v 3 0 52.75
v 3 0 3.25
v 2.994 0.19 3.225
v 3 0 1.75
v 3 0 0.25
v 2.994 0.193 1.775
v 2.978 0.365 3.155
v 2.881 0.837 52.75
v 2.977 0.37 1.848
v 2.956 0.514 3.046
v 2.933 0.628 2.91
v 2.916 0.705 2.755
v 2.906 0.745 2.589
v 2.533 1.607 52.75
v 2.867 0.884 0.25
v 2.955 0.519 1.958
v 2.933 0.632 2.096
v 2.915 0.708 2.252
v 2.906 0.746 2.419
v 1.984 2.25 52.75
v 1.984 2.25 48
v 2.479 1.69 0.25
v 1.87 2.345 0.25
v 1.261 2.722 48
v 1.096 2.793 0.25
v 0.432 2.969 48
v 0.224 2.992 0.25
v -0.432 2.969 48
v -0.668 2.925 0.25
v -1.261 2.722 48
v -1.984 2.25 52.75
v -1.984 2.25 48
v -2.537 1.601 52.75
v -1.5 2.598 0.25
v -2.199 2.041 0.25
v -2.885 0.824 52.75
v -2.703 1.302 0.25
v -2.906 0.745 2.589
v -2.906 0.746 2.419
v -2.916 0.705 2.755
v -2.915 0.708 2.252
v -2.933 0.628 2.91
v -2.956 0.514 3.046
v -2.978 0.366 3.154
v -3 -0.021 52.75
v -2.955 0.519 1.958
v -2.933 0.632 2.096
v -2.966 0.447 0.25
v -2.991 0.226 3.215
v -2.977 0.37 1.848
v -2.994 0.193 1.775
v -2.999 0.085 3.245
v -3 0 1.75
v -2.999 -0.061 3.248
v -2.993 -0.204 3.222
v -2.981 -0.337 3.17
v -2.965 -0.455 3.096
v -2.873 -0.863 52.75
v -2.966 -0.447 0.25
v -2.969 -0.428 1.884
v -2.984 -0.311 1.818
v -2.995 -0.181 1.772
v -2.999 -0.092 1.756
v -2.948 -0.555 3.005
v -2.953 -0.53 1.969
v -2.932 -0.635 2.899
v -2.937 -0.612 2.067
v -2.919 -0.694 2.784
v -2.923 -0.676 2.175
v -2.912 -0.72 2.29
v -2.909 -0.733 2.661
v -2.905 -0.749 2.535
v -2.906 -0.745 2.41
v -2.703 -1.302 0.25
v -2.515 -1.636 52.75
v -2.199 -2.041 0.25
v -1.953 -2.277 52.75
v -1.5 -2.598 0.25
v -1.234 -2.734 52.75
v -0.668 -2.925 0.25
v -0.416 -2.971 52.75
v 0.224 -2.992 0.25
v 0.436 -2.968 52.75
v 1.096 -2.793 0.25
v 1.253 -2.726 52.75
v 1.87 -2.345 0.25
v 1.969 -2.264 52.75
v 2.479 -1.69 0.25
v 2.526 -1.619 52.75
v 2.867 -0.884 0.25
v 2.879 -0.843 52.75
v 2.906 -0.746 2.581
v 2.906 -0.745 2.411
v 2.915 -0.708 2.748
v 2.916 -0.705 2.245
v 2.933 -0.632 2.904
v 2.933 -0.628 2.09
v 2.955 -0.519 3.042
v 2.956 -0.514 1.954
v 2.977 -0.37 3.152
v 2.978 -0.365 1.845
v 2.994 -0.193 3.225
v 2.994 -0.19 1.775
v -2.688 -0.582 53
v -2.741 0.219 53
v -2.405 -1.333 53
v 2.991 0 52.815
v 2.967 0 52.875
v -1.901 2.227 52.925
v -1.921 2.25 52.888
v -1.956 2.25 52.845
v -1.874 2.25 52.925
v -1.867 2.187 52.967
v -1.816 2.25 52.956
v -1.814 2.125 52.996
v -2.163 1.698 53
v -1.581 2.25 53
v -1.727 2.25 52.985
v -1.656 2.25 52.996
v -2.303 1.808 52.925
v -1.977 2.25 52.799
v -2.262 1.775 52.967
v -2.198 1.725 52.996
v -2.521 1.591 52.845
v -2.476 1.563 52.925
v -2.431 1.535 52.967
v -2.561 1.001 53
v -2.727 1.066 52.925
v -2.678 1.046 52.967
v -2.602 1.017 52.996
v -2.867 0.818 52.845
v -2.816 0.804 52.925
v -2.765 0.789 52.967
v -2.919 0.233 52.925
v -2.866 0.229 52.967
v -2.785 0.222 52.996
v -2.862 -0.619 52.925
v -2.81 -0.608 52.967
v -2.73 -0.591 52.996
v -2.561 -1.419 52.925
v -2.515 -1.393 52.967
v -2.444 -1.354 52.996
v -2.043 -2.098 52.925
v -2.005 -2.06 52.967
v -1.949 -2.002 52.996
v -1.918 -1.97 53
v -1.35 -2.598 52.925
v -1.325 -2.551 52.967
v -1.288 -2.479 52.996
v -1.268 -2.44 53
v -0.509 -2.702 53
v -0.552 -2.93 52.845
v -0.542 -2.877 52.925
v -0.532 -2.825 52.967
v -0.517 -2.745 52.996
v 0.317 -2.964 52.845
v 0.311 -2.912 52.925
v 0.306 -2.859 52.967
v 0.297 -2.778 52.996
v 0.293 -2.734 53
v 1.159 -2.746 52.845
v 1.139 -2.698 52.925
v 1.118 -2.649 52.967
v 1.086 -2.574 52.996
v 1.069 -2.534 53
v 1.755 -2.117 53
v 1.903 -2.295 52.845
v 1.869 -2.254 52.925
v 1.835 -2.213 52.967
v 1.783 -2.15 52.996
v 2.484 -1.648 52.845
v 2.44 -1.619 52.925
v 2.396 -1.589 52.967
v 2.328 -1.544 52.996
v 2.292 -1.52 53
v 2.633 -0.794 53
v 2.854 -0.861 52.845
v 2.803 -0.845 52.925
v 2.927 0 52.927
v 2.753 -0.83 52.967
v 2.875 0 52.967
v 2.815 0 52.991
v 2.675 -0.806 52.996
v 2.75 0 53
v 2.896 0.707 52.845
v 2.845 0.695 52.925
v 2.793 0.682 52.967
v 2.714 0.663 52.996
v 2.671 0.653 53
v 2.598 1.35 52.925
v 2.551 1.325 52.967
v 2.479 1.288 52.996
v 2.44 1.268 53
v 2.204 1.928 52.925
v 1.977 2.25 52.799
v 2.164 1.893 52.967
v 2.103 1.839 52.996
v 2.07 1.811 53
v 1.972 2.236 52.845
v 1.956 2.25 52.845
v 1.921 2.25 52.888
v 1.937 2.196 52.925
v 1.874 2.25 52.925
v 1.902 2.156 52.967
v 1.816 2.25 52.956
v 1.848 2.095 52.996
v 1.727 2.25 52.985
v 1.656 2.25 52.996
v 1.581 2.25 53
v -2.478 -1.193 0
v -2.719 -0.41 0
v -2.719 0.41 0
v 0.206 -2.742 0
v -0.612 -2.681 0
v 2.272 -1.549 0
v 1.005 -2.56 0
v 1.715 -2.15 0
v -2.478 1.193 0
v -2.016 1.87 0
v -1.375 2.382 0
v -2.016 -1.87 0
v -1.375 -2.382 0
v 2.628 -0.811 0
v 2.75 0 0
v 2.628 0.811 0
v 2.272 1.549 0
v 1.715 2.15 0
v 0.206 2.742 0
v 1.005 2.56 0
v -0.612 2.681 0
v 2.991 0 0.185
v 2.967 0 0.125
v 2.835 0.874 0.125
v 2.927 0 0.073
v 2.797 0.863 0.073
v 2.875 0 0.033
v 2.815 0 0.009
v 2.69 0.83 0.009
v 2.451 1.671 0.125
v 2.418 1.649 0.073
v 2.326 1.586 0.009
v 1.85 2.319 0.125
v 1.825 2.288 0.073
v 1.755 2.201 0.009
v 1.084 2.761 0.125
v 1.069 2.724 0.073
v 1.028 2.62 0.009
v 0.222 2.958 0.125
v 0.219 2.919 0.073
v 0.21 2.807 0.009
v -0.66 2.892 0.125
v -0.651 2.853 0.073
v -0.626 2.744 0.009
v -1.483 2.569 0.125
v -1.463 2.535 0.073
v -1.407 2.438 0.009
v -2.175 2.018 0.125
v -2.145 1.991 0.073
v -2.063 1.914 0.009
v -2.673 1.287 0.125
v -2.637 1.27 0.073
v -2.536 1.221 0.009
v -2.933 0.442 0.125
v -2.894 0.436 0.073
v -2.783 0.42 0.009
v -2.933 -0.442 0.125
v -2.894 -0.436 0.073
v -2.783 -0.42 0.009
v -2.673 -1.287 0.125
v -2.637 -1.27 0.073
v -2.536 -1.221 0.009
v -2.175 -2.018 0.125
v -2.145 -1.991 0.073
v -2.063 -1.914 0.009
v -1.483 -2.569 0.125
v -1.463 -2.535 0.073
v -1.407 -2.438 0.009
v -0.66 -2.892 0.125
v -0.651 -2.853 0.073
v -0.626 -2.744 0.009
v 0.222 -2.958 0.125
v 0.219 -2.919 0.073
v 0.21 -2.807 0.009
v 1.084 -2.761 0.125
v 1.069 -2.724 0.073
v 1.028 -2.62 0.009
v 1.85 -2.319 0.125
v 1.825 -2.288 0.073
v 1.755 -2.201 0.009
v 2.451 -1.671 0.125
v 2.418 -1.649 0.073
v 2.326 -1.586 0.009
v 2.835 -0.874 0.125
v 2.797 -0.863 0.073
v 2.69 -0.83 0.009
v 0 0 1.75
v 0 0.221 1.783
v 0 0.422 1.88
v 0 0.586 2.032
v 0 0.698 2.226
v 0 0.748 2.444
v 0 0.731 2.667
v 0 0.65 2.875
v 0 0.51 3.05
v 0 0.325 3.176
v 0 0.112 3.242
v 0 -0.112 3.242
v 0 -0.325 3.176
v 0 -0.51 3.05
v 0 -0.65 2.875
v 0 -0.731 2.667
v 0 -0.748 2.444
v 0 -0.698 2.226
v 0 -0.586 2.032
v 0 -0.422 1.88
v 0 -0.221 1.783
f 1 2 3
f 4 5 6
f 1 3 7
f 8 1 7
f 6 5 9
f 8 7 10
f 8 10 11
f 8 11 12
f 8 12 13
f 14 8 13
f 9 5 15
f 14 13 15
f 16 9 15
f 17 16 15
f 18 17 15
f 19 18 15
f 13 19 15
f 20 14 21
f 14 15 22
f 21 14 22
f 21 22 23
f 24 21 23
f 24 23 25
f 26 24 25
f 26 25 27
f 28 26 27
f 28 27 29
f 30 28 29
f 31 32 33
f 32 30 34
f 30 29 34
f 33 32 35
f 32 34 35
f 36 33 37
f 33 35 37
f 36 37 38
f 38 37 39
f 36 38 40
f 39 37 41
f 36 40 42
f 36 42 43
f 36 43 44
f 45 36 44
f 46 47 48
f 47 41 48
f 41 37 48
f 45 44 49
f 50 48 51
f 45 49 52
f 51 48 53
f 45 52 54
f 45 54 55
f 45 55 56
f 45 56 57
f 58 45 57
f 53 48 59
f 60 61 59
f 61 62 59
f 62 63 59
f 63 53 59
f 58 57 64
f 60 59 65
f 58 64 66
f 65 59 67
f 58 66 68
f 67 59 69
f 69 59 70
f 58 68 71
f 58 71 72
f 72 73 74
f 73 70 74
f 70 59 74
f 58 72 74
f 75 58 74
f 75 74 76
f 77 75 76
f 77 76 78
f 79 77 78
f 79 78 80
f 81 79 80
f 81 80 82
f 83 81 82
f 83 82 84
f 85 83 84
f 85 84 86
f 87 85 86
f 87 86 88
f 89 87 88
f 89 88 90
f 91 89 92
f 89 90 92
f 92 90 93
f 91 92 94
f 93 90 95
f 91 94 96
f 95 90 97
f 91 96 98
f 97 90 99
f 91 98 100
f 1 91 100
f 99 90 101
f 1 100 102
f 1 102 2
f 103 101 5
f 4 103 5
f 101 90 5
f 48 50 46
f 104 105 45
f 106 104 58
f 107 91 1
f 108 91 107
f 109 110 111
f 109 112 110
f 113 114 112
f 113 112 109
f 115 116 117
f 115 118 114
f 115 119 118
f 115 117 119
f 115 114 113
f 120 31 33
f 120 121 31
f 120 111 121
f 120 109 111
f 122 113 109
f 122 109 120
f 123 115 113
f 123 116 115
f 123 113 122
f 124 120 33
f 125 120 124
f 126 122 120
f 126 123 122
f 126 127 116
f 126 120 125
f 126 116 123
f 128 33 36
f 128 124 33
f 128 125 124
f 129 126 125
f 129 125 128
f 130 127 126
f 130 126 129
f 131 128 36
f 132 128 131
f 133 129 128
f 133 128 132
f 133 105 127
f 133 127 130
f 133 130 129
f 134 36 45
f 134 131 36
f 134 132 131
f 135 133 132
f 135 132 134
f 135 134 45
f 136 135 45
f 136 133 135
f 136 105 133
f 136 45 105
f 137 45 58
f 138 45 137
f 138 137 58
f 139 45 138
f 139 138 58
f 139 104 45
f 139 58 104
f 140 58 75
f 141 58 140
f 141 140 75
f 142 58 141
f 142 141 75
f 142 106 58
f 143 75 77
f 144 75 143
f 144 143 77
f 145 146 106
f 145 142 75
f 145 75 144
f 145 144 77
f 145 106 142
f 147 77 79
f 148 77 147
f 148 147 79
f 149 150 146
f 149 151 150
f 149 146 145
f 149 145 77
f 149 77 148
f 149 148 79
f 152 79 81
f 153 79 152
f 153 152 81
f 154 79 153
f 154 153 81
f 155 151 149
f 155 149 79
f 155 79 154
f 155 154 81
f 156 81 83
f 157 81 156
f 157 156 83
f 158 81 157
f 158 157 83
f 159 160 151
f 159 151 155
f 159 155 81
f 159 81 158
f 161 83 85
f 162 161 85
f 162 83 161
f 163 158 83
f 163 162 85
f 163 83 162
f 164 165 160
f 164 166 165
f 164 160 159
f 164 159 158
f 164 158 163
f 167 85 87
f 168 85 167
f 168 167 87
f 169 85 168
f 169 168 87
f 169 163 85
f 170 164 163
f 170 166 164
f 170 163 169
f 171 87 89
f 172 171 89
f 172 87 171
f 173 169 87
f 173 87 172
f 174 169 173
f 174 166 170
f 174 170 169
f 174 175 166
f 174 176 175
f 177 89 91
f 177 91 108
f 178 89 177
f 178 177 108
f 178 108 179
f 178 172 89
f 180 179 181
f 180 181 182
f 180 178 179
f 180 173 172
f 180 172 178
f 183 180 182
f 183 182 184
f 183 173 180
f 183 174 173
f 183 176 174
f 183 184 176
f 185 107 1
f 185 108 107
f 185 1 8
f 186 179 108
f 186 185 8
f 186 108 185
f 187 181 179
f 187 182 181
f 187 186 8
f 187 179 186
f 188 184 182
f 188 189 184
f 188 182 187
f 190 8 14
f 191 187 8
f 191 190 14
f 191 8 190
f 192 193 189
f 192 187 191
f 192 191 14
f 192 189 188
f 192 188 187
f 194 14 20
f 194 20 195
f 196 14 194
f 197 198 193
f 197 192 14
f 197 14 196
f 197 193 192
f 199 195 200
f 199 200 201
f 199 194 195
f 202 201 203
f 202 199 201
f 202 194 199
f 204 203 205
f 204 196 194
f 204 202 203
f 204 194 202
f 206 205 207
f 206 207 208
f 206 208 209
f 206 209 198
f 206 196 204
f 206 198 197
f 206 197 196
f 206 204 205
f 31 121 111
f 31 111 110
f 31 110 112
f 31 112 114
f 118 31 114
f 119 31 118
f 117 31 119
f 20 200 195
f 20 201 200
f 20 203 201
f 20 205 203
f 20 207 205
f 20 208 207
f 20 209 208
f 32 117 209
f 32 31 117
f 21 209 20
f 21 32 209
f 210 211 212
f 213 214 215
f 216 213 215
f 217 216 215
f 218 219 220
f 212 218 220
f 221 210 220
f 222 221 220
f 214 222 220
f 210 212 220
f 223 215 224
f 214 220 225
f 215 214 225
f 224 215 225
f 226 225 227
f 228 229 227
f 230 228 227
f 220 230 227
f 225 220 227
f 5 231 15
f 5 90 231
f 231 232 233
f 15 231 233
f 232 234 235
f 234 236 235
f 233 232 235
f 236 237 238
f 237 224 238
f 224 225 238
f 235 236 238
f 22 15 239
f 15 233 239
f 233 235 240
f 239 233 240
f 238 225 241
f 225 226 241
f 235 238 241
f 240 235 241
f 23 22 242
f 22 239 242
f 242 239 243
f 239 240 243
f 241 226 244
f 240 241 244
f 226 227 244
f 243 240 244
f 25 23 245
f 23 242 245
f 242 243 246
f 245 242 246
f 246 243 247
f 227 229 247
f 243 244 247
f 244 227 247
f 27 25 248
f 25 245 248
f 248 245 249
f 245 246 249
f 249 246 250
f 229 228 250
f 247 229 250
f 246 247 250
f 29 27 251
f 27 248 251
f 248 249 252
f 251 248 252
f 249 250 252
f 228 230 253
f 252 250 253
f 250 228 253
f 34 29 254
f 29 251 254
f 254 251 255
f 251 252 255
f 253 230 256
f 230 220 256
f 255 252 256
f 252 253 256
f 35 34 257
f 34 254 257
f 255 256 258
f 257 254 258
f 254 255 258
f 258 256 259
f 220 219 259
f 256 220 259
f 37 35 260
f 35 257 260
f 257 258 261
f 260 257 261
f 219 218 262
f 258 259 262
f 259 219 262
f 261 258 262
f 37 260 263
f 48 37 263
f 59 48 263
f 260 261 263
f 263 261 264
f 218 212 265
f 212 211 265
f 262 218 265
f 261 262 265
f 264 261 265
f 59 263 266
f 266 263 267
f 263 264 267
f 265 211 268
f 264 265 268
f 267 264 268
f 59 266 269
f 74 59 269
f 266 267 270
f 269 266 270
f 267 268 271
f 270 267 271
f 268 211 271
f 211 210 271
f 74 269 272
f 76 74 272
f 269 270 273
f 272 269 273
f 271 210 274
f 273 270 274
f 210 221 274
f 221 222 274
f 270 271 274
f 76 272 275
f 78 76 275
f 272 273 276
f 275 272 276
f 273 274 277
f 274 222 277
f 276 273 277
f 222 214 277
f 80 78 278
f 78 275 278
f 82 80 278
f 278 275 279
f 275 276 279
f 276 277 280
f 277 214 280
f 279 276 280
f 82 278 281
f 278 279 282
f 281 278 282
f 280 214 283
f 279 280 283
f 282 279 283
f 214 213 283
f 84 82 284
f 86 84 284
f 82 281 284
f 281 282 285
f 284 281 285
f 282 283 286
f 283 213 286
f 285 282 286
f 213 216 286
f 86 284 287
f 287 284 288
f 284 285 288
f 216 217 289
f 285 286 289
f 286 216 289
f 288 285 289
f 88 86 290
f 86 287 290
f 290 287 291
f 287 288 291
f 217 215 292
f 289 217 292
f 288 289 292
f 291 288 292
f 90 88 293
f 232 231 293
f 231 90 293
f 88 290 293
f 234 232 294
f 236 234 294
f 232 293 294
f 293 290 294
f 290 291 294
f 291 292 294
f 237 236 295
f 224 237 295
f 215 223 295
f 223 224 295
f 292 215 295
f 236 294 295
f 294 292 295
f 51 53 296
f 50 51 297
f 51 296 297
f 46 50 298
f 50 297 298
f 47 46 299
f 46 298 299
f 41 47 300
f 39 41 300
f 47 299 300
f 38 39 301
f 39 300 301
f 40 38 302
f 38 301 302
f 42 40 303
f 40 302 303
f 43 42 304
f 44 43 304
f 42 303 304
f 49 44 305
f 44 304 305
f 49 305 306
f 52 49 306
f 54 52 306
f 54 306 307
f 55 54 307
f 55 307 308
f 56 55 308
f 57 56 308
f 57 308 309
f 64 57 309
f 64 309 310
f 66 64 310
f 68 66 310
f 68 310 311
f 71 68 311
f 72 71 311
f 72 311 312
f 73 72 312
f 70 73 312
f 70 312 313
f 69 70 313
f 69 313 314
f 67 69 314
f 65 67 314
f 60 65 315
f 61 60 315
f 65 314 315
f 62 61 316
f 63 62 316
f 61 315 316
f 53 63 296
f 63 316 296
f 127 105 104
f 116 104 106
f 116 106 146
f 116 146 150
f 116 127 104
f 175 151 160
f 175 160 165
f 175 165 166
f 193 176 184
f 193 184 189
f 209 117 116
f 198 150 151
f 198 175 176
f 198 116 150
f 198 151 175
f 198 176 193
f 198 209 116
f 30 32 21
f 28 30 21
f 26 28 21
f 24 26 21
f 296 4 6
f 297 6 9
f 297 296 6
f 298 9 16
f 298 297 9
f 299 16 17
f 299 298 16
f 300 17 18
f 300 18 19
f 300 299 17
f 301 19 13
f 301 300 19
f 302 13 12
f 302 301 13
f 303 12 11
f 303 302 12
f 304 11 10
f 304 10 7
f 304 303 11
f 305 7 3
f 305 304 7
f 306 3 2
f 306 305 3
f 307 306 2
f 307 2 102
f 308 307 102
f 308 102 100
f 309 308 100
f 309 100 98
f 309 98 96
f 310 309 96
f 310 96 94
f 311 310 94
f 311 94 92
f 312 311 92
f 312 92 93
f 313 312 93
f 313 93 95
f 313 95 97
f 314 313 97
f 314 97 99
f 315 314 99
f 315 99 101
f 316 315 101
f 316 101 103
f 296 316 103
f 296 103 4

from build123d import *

# Parameters (mm, degrees)
SKETCH1_R               = 3
BOSS_EXTRUDE1_DEPTH     = 53
FILLET1_R               = 0.25
SKETCH2_R               = 0.75
CUT_EXTRUDE1_DEPTH      = 4.0000001
CUT_EXTRUDE1_DEPTH_BACK = 4.0000001
SKETCH4_W               = 15
SKETCH4_H               = 5
CUT_EXTRUDE2_DEPTH      = 53


with BuildPart() as part:
    # Sketch1 → Boss-Extrude1 (new body)
    with BuildSketch(Plane.XY):
        Circle(SKETCH1_R)
    extrude(amount=BOSS_EXTRUDE1_DEPTH)

    # Fillet1
    fillet1_edges = [part.edges().sort_by_distance(p)[0] for p in [
        (-3, 0, 0),
        (-3, 0, 53),
    ]]
    fillet(fillet1_edges, radius=FILLET1_R)

    # Sketch2 → Cut-Extrude1 (cut, two sides)
    with BuildSketch(Plane(origin=(0, 0, 0), x_dir=(0, 0, -1), z_dir=(1, 0, 0))) as cut_extrude1_sk:
        with Locations((-2.5, 0)):
            Circle(SKETCH2_R)
    extrude(amount=CUT_EXTRUDE1_DEPTH, mode=Mode.SUBTRACT)
    extrude(cut_extrude1_sk.sketch, amount=-CUT_EXTRUDE1_DEPTH_BACK, mode=Mode.SUBTRACT)

    # Sketch4 → Cut-Extrude2 (cut)
    with BuildSketch(Plane(origin=(0, 2.25, 0), x_dir=(1, 0, 0), z_dir=(0, 1, 0))):
        with Locations((0.79883006, -50.5)):
            Rectangle(SKETCH4_W, SKETCH4_H)
    extrude(amount=CUT_EXTRUDE2_DEPTH, mode=Mode.SUBTRACT)


solid = part.part
